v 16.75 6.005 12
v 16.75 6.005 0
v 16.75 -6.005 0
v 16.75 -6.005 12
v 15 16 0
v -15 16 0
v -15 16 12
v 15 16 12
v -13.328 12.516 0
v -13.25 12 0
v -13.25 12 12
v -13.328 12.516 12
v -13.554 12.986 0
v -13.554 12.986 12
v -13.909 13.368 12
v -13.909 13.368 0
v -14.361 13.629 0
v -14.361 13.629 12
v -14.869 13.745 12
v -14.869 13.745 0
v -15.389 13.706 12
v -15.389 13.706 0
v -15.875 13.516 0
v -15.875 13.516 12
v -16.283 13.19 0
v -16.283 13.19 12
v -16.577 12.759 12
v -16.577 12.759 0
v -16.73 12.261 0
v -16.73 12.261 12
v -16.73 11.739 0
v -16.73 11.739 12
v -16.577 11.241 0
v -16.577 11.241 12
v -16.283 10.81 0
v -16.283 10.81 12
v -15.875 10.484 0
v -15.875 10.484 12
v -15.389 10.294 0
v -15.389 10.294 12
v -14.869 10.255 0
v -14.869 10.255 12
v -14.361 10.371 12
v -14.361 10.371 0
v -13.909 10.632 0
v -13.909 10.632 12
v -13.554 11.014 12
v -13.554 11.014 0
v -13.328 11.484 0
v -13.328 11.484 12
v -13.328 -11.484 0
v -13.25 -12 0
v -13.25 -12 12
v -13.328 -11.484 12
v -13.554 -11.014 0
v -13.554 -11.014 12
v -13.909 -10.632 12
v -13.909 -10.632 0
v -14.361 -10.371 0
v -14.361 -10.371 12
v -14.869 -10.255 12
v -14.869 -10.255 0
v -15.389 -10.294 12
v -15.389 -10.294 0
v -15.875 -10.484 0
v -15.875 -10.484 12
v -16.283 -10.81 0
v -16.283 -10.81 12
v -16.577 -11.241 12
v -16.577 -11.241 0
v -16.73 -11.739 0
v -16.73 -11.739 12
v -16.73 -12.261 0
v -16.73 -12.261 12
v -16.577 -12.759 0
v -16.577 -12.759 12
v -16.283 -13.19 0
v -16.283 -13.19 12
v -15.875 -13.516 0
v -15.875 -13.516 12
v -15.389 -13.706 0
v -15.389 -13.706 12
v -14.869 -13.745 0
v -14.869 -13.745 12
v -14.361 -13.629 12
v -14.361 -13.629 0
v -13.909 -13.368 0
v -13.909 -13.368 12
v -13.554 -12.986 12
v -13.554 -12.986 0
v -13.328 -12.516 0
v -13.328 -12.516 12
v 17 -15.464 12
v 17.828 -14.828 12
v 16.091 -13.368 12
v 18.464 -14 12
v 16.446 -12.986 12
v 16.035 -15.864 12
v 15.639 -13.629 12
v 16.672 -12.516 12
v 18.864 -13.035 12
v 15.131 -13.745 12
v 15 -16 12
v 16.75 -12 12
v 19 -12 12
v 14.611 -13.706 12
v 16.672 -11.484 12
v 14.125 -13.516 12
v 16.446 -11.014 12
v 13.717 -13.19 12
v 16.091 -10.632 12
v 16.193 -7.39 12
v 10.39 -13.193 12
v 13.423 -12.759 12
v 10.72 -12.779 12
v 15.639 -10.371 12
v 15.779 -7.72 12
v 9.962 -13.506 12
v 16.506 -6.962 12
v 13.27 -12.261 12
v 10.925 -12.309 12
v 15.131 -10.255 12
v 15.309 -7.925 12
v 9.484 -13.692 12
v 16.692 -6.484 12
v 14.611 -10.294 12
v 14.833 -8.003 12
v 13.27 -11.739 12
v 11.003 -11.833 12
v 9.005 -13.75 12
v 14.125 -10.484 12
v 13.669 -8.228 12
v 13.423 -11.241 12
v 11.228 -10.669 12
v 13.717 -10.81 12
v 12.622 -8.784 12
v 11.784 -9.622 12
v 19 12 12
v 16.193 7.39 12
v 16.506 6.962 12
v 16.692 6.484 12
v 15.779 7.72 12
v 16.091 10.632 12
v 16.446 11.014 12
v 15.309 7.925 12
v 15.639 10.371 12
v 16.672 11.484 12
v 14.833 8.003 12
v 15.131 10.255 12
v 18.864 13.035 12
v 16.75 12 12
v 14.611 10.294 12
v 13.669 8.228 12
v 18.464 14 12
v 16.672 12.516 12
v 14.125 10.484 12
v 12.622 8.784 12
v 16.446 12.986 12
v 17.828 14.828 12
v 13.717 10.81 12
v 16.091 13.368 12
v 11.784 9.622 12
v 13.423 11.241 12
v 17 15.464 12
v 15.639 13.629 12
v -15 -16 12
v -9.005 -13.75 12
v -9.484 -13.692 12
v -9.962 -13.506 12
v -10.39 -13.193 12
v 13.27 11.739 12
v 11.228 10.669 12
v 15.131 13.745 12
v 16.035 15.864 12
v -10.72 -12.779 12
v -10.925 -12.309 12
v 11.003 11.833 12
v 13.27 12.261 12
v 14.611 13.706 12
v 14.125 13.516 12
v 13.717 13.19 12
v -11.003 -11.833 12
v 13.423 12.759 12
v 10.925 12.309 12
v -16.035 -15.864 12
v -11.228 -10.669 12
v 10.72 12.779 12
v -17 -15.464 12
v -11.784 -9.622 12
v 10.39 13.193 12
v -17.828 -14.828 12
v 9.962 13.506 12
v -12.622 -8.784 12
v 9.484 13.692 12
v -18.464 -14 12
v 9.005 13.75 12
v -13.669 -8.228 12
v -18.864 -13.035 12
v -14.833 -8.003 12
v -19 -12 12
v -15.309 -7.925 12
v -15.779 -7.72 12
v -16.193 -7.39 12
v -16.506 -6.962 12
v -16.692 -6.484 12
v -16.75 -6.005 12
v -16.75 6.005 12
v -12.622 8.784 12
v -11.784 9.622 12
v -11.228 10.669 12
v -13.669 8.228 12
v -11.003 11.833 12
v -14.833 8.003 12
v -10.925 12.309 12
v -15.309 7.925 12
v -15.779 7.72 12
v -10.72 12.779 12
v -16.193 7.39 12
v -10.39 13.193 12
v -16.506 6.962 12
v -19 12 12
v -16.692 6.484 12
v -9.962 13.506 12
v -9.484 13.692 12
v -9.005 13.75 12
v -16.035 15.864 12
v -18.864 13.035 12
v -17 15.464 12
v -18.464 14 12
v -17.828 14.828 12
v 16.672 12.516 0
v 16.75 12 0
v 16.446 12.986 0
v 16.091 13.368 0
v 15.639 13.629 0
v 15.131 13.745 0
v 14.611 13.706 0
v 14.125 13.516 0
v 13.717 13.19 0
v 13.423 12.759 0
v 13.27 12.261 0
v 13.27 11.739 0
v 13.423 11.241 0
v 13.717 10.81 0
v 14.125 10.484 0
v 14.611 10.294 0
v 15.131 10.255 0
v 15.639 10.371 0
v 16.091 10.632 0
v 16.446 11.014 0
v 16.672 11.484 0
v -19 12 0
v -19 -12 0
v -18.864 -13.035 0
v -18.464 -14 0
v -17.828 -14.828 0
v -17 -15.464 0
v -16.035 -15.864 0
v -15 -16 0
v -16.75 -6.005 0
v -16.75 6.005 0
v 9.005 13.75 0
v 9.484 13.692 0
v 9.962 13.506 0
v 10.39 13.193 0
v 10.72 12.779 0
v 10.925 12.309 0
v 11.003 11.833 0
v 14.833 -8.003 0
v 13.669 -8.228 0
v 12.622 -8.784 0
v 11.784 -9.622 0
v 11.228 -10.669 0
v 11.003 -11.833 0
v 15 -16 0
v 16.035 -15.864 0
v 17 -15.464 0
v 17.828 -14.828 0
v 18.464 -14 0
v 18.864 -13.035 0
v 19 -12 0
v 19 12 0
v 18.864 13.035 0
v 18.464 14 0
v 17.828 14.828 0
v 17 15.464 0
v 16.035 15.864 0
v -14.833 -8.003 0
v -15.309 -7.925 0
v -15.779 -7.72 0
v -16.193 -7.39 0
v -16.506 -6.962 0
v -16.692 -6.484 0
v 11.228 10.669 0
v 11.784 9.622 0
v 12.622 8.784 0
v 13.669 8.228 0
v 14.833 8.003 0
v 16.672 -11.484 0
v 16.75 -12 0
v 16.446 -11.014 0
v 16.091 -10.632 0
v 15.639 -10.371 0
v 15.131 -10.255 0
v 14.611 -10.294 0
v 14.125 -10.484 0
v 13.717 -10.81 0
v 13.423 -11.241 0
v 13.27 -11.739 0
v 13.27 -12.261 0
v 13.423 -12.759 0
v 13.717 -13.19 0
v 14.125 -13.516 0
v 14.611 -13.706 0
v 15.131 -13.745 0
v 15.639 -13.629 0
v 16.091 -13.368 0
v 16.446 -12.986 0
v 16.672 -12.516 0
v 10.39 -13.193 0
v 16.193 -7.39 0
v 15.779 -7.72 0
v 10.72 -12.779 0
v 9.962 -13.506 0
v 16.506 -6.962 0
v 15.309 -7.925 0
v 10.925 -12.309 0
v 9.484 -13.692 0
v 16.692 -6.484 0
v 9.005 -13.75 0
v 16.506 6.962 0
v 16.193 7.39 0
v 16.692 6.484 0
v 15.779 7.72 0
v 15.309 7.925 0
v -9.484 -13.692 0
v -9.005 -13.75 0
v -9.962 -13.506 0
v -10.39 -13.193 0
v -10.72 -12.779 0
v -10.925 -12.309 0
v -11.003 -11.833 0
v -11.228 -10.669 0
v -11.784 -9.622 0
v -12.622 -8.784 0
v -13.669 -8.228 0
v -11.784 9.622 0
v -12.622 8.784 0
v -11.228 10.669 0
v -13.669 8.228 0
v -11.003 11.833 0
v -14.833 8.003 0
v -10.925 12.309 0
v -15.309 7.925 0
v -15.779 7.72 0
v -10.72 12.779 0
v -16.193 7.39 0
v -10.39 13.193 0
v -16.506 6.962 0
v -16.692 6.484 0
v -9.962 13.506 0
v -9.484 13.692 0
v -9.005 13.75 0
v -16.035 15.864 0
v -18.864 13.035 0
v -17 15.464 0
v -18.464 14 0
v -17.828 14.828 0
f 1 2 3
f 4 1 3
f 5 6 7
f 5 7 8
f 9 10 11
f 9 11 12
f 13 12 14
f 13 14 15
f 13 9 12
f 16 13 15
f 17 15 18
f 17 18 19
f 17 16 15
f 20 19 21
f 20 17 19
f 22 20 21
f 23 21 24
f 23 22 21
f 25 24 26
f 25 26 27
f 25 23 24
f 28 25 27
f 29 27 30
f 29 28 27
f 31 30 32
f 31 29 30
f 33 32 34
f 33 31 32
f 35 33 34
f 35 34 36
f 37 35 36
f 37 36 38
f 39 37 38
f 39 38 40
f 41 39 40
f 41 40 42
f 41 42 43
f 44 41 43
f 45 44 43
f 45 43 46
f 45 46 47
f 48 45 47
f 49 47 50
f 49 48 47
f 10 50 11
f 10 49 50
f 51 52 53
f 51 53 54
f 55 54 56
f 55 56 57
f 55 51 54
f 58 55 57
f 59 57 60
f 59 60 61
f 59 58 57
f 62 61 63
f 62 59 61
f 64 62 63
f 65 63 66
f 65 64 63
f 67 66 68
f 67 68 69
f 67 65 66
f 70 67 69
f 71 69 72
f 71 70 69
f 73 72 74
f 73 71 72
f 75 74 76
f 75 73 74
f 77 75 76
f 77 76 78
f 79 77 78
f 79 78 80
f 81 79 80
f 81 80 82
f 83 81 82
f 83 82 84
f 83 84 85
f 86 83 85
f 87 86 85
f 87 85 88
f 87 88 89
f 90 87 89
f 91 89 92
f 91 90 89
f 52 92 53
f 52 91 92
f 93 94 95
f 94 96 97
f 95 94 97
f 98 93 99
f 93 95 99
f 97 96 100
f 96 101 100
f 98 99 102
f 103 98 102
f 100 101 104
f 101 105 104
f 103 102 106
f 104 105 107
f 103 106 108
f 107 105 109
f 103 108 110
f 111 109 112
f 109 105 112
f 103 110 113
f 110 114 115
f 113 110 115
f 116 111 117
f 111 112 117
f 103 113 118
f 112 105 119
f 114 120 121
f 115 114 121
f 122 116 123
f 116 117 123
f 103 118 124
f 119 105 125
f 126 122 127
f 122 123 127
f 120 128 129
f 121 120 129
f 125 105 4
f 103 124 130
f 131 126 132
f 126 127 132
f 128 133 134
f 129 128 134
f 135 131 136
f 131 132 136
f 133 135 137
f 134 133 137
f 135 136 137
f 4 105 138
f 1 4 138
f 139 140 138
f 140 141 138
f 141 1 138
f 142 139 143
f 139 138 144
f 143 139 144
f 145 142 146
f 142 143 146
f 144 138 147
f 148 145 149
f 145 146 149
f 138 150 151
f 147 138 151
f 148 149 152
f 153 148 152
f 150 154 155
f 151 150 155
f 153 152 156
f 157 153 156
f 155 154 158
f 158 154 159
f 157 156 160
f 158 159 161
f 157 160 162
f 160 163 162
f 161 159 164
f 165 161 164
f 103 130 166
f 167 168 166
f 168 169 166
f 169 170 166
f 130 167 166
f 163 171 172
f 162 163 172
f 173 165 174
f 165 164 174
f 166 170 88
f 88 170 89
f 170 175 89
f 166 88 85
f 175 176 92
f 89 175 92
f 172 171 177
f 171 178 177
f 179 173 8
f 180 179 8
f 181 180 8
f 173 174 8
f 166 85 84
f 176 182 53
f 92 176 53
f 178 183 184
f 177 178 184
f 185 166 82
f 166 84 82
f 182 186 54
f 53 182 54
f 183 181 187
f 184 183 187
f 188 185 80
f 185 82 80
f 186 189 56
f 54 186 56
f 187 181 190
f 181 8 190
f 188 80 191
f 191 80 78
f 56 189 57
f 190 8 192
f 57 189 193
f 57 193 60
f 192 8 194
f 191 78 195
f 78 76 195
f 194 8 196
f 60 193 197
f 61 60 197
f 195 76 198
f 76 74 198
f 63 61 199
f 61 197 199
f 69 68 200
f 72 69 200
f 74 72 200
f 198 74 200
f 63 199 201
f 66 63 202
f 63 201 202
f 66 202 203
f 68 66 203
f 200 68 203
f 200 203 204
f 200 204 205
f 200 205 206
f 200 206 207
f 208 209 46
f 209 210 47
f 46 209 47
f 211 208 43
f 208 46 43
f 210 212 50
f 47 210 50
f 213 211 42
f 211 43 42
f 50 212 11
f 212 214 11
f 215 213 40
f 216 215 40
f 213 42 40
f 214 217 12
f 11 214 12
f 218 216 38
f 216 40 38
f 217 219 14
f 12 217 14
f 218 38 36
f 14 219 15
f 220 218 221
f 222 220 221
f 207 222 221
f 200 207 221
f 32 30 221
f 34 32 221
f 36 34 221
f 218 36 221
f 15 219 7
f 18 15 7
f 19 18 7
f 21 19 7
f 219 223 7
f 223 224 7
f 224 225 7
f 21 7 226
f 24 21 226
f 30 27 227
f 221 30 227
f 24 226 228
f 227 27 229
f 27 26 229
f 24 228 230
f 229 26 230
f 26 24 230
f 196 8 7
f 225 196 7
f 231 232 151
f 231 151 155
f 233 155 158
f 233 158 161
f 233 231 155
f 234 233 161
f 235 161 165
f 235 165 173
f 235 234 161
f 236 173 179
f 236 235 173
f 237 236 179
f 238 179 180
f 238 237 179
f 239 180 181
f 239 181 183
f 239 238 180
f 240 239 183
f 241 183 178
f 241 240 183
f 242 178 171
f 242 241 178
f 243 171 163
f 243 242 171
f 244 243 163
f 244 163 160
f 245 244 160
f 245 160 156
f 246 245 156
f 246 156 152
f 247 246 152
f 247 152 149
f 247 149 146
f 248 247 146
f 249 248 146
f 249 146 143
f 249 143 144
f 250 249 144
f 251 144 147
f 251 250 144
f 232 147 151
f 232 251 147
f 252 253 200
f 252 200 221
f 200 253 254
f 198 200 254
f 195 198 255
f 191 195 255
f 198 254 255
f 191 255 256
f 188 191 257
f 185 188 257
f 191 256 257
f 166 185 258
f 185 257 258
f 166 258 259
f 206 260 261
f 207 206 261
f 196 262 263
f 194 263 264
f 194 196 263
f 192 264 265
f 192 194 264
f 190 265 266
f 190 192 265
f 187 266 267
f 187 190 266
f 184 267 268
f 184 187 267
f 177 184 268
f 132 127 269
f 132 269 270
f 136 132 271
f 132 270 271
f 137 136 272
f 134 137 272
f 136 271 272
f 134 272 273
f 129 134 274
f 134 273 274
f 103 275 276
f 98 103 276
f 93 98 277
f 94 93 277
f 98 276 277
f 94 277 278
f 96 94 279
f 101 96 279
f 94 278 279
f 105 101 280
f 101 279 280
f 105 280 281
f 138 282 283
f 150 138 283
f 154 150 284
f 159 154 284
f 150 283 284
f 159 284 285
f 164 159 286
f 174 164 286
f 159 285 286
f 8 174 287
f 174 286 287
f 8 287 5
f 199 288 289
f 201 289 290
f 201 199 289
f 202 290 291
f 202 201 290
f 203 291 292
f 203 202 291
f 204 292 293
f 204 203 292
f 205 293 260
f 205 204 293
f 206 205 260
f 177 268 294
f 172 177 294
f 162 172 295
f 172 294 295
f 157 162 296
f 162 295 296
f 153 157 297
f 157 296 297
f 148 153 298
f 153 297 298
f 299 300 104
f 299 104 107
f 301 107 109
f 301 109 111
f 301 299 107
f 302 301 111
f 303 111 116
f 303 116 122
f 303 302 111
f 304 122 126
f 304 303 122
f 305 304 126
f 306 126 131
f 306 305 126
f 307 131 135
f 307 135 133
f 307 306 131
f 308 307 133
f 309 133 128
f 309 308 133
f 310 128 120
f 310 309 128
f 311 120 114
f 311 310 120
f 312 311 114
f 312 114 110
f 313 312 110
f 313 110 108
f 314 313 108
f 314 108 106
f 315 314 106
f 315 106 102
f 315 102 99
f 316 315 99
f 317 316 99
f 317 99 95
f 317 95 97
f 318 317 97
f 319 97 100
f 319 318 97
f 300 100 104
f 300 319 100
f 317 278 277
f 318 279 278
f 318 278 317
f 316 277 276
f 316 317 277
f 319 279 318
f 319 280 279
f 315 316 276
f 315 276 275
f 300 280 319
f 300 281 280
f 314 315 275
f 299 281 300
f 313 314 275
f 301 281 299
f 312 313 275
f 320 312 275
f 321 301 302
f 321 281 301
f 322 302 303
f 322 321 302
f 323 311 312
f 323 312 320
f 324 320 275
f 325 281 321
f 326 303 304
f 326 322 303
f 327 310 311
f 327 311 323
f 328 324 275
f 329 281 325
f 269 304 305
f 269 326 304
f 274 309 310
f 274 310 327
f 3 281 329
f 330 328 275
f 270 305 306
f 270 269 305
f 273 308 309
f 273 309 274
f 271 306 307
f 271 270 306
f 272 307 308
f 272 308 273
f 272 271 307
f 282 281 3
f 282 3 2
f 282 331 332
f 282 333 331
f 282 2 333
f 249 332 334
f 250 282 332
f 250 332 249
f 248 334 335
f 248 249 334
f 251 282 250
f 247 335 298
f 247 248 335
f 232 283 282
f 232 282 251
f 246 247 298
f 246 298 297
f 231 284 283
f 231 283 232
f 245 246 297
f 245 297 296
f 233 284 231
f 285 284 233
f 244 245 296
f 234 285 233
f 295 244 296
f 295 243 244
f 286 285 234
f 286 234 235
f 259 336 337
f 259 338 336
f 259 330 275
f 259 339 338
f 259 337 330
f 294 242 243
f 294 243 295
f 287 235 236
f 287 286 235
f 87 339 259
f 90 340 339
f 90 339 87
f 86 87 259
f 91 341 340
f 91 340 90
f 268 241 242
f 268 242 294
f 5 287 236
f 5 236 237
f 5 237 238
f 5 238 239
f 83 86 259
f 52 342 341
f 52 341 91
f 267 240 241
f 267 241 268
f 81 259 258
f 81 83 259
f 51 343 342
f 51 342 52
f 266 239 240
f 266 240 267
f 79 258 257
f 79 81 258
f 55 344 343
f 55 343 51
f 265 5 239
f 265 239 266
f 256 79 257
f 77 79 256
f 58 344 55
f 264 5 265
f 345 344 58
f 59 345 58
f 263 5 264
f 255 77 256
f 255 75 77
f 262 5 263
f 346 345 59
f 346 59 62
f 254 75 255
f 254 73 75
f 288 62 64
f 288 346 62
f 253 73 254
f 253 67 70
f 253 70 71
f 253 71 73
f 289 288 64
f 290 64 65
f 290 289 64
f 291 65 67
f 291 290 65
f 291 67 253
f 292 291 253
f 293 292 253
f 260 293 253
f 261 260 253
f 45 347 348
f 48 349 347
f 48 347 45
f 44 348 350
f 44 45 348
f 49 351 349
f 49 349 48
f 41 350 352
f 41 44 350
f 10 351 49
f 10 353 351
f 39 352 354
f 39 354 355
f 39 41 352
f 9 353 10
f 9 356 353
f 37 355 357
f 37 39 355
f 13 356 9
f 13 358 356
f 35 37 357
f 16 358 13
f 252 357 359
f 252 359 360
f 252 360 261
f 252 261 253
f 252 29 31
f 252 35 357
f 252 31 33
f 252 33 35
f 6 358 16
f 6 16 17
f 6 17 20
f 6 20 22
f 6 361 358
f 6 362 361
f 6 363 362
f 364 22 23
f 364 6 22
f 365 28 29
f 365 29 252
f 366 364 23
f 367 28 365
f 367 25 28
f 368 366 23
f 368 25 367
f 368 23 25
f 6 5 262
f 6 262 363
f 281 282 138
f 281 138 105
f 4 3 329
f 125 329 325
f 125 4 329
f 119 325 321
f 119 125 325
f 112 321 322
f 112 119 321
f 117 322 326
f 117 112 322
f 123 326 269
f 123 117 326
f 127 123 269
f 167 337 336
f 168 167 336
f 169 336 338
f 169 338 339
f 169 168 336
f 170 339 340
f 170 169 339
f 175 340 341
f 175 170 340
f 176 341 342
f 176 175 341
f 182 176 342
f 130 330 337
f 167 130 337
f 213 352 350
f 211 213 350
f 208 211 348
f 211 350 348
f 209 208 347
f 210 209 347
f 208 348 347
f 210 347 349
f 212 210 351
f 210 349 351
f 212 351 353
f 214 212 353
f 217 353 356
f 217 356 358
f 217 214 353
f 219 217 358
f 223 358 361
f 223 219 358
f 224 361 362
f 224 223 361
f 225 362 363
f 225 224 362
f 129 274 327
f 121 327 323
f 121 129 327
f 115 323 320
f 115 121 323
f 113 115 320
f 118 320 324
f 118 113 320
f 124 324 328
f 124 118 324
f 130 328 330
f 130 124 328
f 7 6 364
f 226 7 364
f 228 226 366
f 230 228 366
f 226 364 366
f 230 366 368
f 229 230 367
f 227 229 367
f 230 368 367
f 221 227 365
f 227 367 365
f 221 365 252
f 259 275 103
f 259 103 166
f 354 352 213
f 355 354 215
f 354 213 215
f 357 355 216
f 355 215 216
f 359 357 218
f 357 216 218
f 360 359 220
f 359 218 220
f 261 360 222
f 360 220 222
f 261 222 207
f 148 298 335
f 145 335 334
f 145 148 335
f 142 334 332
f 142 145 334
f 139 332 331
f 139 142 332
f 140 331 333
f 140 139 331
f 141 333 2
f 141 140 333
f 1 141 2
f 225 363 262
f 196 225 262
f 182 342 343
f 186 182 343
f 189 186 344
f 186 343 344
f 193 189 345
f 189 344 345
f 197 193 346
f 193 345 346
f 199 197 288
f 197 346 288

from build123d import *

# Parameters (mm, degrees)
SKETCH_R  = 1.75
PAD_DEPTH = 12
FILLET_R  = 2


with BuildPart() as part:
    # Sketch → Pad (new body)
    with BuildSketch(Plane.XY):
        with BuildLine():
            Line((-15, 16), (15, 16))
            ThreePointArc((19, 12), (17.828427, 14.828427), (15, 16))
            Line((19, 12), (19, -12))
            ThreePointArc((15, -16), (17.828427, -14.828427), (19, -12))
            Line((15, -16), (-15, -16))
            ThreePointArc((-19, -12), (-17.828427, -14.828427), (-15, -16))
            Line((-19, -12), (-19, 12))
            ThreePointArc((-15, 16), (-17.828427, 14.828427), (-19, 12))
        make_face()
        with Locations((-15, 12)):
            Circle(SKETCH_R, mode=Mode.SUBTRACT)
        with Locations((15, 12)):
            Circle(SKETCH_R, mode=Mode.SUBTRACT)
        with Locations((15, -12)):
            Circle(SKETCH_R, mode=Mode.SUBTRACT)
        with Locations((-15, -12)):
            Circle(SKETCH_R, mode=Mode.SUBTRACT)
        with BuildLine():
            Line((-16.75, 8), (-15, 8))
            ThreePointArc((-15, 8), (-12.171573, 9.171573), (-11, 12))
            Line((-11, 12), (-11, 13.75))
            Line((-11, 13.75), (11, 13.75))
            Line((11, 13.75), (11, 12))
            ThreePointArc((11, 12), (12.171573, 9.171573), (15, 8))
            Line((15, 8), (16.75, 8))
            Line((16.75, 8), (16.75, -8))
            Line((15, -8), (16.75, -8))
            ThreePointArc((15, -8), (12.171573, -9.171573), (11, -12))
            Line((11, -13.75), (11, -12))
            Line((11, -13.75), (-11, -13.75))
            Line((-11, -12), (-11, -13.75))
            ThreePointArc((-11, -12), (-12.171573, -9.171573), (-15, -8))
            Line((-16.75, -8), (-15, -8))
            Line((-16.75, -8), (-16.75, 8))
        make_face(mode=Mode.SUBTRACT)
    extrude(amount=PAD_DEPTH)

    # Fillet
    fillet_edges = [part.edges().sort_by_distance(p)[0] for p in [
        (-11, 13.75, 6),
        (-16.75, 8, 6),
        (11, 13.75, 6),
        (16.75, 8, 6),
        (16.75, -8, 6),
        (11, -13.75, 6),
        (-11, -13.75, 6),
        (-16.75, -8, 6),
    ]]
    fillet(fillet_edges, radius=FILLET_R)


solid = part.part
